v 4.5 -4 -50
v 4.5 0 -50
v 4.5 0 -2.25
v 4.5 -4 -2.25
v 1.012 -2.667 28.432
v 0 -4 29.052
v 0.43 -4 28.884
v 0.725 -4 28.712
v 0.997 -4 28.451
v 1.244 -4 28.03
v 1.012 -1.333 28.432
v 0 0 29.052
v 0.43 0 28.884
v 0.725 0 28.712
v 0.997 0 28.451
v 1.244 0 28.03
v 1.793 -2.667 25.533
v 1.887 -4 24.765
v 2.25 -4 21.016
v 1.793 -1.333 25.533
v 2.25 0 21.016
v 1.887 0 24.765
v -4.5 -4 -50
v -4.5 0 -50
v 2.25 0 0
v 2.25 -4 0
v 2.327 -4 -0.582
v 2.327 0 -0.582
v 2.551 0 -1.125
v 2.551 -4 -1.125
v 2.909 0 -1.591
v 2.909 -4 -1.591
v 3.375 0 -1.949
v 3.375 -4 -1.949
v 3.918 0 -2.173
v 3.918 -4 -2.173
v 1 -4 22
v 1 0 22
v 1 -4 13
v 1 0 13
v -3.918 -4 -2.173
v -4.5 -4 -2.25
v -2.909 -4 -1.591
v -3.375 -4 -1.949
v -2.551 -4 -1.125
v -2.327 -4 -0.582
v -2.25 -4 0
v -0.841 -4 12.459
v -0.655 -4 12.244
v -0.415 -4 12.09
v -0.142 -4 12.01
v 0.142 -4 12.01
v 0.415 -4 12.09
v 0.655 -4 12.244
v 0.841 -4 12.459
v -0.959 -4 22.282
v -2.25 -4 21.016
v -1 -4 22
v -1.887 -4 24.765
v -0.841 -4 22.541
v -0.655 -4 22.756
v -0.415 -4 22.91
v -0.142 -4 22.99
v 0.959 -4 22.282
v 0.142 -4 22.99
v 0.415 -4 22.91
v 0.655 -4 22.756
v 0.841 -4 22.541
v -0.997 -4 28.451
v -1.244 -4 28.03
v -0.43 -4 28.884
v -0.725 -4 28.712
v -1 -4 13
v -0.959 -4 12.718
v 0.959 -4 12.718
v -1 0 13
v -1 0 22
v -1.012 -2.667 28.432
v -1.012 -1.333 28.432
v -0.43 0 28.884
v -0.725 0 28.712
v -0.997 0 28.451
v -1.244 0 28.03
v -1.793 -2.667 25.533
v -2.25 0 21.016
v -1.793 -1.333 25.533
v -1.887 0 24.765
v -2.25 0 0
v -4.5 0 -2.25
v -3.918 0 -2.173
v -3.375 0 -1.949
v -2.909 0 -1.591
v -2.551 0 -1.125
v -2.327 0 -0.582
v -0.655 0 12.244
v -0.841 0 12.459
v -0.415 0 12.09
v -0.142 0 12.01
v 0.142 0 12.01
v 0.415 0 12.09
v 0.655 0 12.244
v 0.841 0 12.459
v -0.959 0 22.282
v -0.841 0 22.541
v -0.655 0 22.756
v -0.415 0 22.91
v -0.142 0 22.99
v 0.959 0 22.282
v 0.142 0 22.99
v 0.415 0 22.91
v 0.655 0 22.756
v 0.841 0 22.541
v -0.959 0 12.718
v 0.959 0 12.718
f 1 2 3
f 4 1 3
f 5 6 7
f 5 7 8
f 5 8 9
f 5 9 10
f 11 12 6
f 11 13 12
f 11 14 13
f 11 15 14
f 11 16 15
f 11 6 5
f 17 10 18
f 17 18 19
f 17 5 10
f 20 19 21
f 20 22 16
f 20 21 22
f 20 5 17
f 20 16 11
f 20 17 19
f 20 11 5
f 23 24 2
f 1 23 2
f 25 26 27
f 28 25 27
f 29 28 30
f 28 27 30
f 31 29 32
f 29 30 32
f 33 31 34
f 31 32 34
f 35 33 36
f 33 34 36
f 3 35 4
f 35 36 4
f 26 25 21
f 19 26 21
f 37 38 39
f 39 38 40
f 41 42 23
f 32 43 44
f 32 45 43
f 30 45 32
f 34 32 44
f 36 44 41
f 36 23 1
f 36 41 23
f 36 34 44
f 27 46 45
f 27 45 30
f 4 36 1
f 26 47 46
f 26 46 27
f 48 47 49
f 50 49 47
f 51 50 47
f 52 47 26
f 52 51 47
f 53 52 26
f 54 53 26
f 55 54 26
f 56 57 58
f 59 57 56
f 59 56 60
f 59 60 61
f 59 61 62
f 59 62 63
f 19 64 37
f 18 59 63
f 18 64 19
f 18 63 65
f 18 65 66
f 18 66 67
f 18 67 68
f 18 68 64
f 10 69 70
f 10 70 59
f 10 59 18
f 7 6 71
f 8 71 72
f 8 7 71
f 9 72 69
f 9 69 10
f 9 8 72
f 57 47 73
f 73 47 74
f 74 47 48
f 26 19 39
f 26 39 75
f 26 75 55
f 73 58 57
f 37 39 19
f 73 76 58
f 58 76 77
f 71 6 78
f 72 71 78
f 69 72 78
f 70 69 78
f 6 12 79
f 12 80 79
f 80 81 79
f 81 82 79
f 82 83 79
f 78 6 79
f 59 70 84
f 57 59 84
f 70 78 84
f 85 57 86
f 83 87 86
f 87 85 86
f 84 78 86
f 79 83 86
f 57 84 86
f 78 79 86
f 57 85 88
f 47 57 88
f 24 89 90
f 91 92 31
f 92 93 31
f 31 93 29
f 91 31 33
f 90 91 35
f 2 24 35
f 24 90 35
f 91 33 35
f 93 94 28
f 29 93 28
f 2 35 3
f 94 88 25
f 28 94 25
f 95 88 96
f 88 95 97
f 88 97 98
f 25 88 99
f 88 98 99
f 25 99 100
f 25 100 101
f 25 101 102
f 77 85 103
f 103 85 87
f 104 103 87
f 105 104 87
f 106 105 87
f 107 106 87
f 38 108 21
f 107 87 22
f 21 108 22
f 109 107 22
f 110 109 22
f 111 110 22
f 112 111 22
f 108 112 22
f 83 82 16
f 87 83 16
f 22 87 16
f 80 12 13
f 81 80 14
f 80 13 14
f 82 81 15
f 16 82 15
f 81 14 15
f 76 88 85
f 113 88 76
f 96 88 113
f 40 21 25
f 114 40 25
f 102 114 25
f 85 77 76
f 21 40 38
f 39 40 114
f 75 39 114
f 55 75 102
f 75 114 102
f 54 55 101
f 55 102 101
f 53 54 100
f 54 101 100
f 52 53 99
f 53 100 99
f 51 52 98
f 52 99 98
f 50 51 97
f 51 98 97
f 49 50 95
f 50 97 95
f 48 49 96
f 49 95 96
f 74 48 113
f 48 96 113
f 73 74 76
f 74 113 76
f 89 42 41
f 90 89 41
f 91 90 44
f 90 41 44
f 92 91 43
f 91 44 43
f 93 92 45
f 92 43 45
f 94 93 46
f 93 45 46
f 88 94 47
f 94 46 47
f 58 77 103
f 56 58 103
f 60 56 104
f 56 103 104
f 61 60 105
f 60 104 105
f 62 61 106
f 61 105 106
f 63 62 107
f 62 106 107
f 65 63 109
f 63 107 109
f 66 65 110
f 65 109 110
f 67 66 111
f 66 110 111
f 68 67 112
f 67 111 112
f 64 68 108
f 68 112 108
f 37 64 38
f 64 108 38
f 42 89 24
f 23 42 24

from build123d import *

# Parameters (mm, degrees)
F1_DEPTH = 4
F3_DEPTH = 4.0010001


with BuildPart() as f1:
    # F0 (on Front) → F1 (new body)
    with BuildSketch(Plane.XZ):
        with BuildLine():
            Line((-2.25, 21.0164487362), (-2.25, 0))
            Line((-2.25, 0), (2.25, 0))
            Line((2.25, 0), (2.25, 21.0164487362))
            add(Edge.make_bspline(
                [(0, 29.0521112765), (0.3695458095, 28.9210731345), (1.3268018727, 28.5816373926), (1.8741963924, 25.3153750937), (2.1164189838, 22.5445206862), (2.25, 21.0164487362)],
                knots=[0, 0, 0, 0, 0.219983541, 0.5698361963, 1, 1, 1, 1], degree=3))
            add(Edge.make_bspline(
                [(0, 29.0521112765), (-0.3695458095, 28.9210731345), (-1.3268018727, 28.5816373926), (-1.8741963924, 25.3153750937), (-2.1164189838, 22.5445206862), (-2.25, 21.0164487362)],
                knots=[0, 0, 0, 0, 0.219983541, 0.5698361963, 1, 1, 1, 1], degree=3))
        make_face()
        with BuildLine():
            Line((-1, 13), (-1, 22))
            ThreePointArc((-1, 22), (0, 23), (1, 22))
            Line((1, 22), (1, 13))
            ThreePointArc((1, 13), (0, 12), (-1, 13))
        make_face(mode=Mode.SUBTRACT)
        Polygon((-2.25, 0), (-4.5, 0), (-4.5, -50), (4.5, -50), (4.5, 0), (2.25, 0), align=None)
    extrude(amount=F1_DEPTH)

    # F2 (on face) → F3 (cut, through all)
    with BuildSketch(Plane.XZ.offset(4)):
        with BuildLine():
            Line((4.5, 0), (2.25, 0))
            ThreePointArc((2.25, 0), (2.9090097423, -1.5909902577), (4.5, -2.25))
            Line((4.5, -2.25), (4.5, 0))
        make_face()
        with BuildLine():
            Line((-4.5, 0), (-4.5, -2.25))
            ThreePointArc((-4.5, -2.25), (-2.9090097423, -1.5909902577), (-2.25, 0))
            Line((-2.25, 0), (-4.5, 0))
        make_face()
    extrude(amount=-F3_DEPTH, mode=Mode.SUBTRACT)


solid = f1.part
